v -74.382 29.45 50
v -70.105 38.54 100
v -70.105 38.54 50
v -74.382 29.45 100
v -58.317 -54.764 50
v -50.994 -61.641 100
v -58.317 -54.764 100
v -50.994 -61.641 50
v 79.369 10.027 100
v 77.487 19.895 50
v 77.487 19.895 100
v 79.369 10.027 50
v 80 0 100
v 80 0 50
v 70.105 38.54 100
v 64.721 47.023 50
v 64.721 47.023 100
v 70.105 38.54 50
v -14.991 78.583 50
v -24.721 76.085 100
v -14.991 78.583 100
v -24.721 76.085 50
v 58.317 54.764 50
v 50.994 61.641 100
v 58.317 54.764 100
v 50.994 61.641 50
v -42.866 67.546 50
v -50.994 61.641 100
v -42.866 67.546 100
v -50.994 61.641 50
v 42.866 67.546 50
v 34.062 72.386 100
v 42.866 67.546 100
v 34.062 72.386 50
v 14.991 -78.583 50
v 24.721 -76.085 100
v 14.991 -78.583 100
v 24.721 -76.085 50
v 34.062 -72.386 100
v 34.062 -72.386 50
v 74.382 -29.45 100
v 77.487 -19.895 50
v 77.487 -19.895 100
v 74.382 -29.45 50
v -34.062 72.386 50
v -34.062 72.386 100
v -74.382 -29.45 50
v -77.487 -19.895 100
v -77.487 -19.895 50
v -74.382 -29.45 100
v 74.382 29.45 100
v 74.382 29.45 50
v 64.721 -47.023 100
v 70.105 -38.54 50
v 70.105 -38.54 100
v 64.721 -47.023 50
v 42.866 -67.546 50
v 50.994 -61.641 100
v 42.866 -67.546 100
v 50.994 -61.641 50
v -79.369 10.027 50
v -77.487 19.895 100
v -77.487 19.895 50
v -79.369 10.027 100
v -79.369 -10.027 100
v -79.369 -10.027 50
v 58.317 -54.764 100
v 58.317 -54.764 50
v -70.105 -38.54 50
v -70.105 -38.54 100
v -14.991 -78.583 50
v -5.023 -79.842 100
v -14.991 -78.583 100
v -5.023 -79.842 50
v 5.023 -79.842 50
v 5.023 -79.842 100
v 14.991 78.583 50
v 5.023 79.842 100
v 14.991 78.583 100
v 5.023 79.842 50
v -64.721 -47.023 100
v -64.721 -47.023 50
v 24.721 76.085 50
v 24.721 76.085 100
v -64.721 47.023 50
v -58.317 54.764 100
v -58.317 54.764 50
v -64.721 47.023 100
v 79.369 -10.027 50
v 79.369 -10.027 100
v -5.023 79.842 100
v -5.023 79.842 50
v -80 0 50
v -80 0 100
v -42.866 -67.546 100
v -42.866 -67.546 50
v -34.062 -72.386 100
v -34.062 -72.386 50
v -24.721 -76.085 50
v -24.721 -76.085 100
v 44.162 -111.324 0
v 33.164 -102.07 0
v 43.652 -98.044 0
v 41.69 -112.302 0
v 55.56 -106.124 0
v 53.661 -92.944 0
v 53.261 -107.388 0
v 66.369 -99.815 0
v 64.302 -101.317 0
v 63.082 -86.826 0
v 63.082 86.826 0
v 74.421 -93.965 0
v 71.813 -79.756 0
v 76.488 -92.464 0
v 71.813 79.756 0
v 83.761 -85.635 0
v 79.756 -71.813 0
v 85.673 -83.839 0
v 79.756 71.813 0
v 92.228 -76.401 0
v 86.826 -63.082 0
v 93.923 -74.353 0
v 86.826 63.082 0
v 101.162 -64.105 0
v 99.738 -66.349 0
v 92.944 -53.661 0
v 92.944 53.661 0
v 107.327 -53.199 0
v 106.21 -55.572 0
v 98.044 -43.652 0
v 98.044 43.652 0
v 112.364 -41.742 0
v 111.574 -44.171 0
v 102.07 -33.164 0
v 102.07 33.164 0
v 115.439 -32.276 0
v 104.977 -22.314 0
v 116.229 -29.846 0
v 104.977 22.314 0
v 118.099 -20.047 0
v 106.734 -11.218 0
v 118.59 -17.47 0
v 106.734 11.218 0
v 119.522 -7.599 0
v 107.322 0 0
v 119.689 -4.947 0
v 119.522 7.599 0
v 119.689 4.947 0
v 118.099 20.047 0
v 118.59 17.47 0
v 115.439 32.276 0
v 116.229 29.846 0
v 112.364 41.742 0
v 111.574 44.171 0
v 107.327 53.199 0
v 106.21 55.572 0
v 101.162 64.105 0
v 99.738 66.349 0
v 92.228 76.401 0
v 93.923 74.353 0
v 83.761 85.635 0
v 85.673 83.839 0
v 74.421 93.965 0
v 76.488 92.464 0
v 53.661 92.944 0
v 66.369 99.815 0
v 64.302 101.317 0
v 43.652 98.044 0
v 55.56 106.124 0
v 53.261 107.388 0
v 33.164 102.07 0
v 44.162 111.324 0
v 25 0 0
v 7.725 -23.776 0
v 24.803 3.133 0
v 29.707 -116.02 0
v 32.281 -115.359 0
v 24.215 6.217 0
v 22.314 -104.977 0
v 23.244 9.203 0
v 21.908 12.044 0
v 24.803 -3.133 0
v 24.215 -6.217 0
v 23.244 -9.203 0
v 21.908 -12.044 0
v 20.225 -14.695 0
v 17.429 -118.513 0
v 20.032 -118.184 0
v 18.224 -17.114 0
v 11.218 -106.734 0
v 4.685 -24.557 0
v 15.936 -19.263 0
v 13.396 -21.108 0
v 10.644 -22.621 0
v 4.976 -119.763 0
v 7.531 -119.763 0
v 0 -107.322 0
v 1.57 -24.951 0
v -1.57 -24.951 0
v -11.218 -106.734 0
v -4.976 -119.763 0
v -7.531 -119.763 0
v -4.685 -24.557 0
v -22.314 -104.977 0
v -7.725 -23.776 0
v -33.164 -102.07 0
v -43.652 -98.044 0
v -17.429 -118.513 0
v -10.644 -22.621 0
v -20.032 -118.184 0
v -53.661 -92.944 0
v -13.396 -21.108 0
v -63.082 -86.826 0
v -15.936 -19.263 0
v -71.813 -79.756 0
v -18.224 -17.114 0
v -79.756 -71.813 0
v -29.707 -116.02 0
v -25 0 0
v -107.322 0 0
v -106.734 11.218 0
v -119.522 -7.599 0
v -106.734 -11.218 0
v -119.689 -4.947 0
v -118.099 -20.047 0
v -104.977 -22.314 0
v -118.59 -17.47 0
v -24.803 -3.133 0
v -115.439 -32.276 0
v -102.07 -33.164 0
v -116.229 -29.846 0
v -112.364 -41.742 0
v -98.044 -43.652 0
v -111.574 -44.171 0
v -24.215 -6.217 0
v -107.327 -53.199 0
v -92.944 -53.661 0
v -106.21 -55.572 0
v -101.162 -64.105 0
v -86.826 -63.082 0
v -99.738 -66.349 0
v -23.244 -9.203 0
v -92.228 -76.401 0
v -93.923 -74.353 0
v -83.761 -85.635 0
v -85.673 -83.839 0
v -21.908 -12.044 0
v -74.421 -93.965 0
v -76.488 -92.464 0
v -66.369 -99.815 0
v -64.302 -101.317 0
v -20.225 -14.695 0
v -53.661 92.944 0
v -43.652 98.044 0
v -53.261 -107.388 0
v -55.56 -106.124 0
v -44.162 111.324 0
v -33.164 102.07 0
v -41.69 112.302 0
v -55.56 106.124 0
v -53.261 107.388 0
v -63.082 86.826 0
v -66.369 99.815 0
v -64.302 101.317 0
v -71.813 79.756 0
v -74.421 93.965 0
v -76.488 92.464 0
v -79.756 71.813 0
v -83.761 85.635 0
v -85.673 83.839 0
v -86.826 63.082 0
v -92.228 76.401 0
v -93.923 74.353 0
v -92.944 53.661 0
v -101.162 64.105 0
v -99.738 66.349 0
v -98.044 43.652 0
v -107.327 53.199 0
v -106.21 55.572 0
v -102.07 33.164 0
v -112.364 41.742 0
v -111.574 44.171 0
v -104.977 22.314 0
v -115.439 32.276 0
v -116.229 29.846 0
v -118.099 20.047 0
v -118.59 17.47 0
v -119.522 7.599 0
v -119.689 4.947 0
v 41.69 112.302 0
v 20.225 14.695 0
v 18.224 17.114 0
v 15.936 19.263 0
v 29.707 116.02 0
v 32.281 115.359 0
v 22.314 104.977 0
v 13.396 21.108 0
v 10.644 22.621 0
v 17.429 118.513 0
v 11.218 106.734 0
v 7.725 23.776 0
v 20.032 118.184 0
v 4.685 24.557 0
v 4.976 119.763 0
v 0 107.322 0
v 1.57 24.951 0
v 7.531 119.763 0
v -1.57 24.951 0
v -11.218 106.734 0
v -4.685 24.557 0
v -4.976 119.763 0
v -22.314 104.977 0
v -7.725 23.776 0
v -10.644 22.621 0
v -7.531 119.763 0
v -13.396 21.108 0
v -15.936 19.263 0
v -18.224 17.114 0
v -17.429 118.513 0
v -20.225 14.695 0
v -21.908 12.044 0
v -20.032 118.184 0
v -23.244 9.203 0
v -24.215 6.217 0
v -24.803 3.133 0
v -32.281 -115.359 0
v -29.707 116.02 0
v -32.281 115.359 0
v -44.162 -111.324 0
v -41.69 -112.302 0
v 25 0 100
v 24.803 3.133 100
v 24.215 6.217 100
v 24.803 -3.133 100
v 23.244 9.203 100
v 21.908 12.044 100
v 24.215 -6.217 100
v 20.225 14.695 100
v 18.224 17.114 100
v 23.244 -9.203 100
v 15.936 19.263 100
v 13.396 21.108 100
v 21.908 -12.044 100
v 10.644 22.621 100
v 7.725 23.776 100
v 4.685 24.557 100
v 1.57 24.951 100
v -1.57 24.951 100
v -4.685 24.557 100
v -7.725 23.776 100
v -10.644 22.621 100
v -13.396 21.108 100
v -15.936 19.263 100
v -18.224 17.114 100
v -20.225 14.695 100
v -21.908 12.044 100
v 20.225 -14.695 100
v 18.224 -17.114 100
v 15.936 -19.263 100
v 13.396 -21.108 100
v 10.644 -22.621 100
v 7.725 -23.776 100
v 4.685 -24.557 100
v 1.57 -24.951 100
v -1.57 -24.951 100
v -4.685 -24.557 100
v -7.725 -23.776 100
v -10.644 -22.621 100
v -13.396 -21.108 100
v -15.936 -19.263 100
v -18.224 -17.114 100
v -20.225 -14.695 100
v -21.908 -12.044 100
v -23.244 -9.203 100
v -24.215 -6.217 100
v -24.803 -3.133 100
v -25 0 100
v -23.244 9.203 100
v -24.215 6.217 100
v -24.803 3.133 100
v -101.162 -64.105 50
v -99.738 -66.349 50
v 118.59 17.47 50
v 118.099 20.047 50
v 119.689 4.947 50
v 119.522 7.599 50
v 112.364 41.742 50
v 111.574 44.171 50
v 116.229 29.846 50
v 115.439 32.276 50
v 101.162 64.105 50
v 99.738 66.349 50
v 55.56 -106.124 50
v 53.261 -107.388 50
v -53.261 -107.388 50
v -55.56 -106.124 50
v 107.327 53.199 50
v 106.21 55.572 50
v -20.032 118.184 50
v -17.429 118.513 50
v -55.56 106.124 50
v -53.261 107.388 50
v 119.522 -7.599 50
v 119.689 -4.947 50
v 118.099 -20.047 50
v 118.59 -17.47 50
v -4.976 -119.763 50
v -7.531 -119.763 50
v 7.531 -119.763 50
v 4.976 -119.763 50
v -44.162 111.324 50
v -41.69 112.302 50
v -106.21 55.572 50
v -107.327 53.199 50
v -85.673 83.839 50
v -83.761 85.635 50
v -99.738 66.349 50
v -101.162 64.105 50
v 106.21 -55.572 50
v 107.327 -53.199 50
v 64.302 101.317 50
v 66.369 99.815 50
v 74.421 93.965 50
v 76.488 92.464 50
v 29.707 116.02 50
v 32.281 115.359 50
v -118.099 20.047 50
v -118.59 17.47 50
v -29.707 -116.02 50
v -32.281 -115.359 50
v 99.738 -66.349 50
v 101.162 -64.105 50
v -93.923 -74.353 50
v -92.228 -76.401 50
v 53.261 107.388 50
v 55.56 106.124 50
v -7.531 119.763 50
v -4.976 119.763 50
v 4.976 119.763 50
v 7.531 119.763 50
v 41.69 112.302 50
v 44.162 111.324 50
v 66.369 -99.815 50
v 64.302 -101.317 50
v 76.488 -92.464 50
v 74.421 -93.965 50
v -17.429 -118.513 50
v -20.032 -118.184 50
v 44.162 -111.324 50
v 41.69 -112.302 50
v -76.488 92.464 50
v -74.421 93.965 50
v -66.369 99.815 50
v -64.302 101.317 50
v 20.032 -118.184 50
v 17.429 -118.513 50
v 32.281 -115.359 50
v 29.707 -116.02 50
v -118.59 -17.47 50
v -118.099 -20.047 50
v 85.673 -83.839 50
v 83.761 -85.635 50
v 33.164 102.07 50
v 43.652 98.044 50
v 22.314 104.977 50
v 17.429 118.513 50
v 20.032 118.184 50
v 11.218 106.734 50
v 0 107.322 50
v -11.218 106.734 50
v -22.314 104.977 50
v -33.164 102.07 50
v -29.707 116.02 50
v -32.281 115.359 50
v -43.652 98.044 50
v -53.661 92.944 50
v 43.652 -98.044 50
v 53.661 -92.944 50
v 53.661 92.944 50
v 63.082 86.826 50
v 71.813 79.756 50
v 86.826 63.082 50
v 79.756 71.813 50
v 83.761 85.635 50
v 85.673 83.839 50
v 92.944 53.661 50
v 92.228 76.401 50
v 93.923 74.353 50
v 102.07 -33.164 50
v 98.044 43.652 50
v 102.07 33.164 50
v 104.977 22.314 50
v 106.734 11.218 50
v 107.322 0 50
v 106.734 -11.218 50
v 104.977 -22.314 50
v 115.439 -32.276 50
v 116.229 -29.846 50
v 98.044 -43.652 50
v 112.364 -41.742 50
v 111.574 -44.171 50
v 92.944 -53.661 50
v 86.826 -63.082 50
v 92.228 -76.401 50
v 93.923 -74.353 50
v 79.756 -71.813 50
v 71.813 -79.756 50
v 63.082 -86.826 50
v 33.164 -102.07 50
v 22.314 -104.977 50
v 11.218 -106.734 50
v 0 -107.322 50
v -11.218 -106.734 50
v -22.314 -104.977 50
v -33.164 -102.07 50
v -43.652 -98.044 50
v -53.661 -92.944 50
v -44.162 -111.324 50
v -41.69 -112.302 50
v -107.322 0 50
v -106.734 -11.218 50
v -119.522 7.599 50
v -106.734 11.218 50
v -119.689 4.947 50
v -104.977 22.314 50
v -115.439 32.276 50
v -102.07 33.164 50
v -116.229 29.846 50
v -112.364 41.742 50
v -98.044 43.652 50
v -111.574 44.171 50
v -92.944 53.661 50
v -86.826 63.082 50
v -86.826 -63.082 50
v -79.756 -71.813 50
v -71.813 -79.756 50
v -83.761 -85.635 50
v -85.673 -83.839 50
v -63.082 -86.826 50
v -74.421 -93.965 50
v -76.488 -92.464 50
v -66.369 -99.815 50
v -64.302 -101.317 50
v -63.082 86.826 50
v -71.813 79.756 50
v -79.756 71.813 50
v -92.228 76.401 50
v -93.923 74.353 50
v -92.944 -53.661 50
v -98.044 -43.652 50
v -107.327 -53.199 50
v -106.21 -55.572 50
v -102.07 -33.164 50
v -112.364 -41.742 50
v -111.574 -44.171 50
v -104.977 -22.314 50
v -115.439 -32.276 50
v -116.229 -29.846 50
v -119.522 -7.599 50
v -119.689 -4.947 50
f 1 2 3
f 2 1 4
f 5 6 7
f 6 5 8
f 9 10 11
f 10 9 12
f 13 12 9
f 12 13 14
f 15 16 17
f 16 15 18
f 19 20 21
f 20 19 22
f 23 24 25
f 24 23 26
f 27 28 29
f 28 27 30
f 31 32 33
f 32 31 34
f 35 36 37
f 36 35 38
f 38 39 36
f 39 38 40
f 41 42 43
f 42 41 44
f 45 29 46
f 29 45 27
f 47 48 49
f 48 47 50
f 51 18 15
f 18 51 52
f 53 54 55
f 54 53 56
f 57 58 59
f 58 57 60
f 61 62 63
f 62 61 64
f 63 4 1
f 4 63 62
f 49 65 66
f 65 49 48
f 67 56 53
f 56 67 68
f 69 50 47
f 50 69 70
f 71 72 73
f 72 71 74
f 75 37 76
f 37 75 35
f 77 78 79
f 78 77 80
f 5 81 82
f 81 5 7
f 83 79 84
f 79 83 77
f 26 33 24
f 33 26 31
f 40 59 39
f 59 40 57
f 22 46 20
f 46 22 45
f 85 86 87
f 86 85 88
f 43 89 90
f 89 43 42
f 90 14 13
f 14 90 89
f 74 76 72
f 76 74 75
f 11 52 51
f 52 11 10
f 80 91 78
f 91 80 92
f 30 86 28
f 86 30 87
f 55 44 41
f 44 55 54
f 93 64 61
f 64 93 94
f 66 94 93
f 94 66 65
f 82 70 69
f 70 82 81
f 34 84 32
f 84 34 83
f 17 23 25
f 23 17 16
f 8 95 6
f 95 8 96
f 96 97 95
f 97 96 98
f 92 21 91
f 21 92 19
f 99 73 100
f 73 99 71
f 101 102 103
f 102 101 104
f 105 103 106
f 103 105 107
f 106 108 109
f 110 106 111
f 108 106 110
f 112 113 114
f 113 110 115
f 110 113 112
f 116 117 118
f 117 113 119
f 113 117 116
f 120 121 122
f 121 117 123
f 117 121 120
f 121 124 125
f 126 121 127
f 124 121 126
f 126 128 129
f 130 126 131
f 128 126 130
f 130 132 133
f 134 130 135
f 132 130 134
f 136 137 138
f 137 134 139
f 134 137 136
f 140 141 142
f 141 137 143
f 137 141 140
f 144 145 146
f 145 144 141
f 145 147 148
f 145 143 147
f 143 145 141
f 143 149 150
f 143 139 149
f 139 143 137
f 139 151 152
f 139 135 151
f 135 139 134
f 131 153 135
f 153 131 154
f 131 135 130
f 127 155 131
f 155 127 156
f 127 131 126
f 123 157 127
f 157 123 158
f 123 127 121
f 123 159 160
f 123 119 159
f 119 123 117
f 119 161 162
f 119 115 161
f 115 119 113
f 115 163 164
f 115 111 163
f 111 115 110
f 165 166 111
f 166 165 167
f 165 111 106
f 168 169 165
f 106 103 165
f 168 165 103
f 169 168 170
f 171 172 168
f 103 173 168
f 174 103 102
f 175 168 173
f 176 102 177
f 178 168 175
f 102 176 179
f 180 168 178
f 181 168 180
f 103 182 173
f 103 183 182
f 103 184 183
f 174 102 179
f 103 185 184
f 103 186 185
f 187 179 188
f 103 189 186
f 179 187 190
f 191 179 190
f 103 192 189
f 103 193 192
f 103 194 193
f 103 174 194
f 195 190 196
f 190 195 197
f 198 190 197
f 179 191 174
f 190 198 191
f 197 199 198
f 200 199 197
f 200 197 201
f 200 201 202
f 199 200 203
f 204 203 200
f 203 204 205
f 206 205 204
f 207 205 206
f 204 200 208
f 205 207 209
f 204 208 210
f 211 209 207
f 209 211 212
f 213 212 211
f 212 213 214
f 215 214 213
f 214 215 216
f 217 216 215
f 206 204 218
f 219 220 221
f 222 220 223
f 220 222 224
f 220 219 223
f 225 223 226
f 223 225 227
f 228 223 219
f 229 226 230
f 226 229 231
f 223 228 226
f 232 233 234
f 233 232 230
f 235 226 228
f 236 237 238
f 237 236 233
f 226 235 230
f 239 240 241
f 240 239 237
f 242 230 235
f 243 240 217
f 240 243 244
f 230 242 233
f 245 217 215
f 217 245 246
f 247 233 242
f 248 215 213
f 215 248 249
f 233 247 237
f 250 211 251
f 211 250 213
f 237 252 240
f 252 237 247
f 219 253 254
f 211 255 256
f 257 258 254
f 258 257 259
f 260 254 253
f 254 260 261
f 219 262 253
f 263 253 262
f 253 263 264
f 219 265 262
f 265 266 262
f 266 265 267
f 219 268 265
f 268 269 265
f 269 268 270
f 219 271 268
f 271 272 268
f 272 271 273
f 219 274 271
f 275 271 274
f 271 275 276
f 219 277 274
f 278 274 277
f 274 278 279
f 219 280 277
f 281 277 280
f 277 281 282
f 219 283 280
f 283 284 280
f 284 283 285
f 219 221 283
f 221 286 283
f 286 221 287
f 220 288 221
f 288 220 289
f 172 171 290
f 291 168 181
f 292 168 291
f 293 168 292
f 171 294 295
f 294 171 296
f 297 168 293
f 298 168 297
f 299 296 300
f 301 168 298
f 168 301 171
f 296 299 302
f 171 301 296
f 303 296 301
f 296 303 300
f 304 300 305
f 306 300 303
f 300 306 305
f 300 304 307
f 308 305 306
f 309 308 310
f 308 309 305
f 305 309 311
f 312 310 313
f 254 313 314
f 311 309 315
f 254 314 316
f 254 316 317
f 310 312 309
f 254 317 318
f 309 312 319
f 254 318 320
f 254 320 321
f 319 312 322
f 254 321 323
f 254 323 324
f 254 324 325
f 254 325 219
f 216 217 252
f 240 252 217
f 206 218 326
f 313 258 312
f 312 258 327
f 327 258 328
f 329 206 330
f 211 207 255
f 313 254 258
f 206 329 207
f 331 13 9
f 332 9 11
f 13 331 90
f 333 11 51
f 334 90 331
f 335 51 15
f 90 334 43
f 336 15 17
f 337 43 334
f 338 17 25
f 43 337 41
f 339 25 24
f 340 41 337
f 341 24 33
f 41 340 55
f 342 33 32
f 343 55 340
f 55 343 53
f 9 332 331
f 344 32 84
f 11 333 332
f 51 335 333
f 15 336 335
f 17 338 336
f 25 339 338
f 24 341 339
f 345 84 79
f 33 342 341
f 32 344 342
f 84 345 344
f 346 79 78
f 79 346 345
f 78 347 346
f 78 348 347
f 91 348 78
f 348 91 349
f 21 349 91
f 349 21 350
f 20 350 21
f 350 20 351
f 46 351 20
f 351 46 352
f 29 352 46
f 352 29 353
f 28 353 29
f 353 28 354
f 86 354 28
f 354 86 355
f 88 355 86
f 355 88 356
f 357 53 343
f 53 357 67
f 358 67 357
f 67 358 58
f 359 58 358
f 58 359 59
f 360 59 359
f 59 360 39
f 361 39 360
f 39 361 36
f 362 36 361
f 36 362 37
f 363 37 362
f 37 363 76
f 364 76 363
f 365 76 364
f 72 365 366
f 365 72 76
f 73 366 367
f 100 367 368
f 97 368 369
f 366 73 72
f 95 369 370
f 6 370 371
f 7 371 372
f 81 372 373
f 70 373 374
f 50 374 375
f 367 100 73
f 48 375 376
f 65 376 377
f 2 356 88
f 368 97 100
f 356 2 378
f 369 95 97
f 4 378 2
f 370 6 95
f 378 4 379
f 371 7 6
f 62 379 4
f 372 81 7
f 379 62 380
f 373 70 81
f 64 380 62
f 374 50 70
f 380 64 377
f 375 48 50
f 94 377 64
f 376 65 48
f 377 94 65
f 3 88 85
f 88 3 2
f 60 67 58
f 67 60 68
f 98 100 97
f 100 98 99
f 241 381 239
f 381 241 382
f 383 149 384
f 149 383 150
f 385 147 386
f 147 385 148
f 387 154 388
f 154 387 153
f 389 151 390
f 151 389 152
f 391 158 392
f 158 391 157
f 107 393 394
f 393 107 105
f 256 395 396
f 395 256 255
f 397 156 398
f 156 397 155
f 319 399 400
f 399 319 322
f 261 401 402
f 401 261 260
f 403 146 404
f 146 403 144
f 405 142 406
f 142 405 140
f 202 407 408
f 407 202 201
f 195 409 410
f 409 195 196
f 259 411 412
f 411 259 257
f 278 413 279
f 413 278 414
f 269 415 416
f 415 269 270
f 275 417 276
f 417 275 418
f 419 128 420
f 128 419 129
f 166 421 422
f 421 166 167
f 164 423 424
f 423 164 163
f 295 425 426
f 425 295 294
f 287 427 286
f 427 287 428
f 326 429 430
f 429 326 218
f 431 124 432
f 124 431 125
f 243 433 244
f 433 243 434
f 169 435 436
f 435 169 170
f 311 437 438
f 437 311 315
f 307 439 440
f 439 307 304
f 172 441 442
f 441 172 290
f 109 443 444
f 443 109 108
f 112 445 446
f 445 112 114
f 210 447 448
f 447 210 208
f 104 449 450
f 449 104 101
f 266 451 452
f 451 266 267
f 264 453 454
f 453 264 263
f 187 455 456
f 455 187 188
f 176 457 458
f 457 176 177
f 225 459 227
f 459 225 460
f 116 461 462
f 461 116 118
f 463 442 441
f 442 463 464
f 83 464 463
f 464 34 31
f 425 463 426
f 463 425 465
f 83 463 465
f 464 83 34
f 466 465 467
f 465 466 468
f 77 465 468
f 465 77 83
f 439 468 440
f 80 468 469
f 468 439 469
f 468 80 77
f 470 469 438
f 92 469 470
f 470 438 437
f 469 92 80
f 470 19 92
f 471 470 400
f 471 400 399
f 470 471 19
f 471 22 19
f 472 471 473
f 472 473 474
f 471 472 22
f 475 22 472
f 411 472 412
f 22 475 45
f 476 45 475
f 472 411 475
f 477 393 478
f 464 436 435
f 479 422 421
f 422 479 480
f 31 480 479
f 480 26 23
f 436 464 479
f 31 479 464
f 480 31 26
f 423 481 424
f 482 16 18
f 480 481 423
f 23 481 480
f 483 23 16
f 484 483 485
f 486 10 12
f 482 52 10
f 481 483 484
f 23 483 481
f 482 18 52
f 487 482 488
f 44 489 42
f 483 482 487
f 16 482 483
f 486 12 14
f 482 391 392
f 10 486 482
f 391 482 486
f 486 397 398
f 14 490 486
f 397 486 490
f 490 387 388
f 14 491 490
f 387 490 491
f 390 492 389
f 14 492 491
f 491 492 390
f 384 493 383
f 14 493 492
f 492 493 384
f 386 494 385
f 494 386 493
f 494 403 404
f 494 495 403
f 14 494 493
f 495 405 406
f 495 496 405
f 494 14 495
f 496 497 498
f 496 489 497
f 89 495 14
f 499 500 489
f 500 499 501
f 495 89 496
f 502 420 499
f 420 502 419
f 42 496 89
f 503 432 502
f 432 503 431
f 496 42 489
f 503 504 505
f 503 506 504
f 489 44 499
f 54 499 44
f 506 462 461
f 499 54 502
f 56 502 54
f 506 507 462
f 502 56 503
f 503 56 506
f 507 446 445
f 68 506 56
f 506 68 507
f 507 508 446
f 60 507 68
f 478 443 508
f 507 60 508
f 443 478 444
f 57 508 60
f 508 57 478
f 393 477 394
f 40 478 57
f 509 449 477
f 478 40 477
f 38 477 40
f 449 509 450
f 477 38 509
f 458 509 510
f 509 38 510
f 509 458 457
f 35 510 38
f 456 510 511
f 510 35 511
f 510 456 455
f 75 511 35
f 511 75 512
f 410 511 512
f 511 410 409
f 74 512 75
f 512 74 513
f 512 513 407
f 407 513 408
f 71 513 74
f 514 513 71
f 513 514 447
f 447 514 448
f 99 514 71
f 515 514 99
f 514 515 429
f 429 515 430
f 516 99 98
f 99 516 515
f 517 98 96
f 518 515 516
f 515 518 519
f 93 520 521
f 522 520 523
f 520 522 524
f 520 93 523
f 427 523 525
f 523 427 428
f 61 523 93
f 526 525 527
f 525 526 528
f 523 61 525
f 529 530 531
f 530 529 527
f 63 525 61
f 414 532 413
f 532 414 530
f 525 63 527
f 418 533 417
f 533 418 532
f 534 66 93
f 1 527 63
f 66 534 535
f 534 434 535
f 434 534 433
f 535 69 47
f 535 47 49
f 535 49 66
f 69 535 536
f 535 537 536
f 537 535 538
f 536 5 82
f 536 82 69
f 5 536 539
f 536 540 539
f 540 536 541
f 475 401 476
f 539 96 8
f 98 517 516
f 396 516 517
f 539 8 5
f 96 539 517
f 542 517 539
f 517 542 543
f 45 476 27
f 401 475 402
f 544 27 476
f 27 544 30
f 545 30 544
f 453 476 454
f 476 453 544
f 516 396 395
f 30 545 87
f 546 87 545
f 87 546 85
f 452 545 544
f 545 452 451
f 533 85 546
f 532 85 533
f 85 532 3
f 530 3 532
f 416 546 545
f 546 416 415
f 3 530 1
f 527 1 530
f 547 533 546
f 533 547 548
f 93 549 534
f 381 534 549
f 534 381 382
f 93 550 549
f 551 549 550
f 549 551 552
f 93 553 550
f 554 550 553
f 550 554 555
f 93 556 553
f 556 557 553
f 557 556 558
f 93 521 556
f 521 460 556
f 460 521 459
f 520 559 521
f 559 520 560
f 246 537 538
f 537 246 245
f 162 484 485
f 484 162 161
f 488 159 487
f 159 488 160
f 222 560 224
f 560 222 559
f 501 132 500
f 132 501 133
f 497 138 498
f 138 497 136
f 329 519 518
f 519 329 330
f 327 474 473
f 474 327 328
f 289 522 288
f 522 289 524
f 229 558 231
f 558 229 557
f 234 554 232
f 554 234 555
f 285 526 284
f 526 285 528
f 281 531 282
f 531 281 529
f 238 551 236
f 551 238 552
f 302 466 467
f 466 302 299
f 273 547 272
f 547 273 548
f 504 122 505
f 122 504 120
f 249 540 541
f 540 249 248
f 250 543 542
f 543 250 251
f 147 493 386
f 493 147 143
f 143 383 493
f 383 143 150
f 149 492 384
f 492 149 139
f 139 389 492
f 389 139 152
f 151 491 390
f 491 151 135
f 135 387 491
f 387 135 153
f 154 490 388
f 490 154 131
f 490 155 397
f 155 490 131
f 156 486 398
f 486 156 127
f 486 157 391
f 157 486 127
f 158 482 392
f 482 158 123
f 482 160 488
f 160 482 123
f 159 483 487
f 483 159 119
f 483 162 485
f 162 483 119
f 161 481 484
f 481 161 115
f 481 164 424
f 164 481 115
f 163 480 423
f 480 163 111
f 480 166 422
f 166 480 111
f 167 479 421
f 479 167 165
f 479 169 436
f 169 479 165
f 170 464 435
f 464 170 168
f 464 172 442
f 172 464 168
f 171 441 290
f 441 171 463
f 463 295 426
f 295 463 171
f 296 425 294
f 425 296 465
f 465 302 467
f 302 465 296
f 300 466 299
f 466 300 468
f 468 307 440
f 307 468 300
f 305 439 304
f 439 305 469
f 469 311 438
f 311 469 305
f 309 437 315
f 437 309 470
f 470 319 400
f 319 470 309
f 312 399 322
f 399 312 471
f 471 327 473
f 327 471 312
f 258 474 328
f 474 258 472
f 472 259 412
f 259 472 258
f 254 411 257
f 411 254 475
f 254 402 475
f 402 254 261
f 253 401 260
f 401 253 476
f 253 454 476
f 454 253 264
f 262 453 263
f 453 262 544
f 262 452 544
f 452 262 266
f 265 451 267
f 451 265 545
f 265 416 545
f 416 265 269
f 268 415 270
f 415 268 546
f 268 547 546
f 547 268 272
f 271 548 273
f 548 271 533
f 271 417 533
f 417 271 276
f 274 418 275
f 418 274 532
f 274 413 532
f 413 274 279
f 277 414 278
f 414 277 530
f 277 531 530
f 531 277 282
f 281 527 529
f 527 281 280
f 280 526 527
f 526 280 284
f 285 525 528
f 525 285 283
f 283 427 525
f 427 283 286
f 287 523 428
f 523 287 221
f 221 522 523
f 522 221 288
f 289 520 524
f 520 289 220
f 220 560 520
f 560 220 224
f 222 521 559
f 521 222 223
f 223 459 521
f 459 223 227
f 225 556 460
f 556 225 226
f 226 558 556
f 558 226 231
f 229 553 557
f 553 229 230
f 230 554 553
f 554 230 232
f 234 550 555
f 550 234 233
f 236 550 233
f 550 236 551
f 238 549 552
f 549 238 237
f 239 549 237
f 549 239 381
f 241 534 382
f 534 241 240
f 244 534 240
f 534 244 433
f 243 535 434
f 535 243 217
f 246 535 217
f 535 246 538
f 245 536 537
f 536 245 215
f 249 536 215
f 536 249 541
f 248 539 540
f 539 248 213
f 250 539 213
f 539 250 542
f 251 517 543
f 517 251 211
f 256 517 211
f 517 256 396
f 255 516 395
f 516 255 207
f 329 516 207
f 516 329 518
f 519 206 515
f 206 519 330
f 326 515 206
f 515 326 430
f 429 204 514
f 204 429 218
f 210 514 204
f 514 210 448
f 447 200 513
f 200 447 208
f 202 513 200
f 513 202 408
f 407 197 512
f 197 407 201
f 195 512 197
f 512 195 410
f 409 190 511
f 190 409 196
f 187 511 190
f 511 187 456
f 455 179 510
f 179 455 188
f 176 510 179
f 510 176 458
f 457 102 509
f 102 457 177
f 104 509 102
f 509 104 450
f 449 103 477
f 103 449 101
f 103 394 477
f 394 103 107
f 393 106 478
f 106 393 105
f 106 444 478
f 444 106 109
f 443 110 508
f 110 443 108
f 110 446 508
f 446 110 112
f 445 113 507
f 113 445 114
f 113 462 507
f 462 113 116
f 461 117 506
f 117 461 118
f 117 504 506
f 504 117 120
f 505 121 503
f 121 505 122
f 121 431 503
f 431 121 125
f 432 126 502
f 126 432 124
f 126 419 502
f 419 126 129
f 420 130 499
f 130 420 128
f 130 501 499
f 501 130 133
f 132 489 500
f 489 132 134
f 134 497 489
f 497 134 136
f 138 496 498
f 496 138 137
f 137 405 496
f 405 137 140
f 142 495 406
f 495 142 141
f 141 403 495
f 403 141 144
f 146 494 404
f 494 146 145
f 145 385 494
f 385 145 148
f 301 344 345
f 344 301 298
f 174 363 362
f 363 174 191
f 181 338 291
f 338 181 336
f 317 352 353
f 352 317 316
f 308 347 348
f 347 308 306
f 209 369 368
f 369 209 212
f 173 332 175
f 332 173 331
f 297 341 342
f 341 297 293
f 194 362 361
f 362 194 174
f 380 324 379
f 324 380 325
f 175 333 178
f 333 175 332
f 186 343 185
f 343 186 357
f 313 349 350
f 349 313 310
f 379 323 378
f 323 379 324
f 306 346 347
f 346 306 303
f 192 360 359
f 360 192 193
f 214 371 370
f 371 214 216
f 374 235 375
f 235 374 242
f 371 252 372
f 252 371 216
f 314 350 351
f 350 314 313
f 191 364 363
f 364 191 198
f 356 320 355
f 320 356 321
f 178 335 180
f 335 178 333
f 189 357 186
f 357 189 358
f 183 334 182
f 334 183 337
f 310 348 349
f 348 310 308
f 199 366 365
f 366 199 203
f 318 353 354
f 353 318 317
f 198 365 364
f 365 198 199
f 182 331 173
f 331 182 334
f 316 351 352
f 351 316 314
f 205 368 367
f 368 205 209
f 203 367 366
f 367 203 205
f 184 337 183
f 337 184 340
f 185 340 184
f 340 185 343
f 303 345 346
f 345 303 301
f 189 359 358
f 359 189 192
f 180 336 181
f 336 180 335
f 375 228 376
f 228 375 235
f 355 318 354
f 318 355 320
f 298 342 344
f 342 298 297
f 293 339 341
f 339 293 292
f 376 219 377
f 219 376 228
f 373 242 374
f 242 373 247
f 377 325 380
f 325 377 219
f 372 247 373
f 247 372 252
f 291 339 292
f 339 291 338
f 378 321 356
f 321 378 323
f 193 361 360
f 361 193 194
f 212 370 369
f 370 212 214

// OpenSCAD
$fn = 50;

shaft_r = 80;
shaft_h = 100;

gear_r = shaft_r * 1.5;
gear_h = shaft_h * 0.5;

hole_r = 25;

module shaft() {
    cylinder(r = shaft_r, h = shaft_h);
}

module gear_base() {
    cylinder(r = gear_r, h = gear_h);
}

module center_hole() {
    translate([0, 0, -1]) {
        cylinder(r = hole_r, h = shaft_h + 2);
    }
}

module tooth(x) {
    scale([2.5, 1, 1]) {
        rotate([0, 0, 45]) {
            translate([0, 0, gear_h/2]) {
                cube([10, 10, gear_h + 2], center = true);
            }
        }
    }
}


n_teeth = 60;
difference() {
    union() {
        shaft();
        gear_base();
    }
    center_hole();
    for(i = [1:n_teeth]) {
        rotate([0, 0, i * 360 / n_teeth]) {
            translate([gear_r + 5, 0, 0]) {
                tooth(n_teeth);
            }
        }
    }
}
